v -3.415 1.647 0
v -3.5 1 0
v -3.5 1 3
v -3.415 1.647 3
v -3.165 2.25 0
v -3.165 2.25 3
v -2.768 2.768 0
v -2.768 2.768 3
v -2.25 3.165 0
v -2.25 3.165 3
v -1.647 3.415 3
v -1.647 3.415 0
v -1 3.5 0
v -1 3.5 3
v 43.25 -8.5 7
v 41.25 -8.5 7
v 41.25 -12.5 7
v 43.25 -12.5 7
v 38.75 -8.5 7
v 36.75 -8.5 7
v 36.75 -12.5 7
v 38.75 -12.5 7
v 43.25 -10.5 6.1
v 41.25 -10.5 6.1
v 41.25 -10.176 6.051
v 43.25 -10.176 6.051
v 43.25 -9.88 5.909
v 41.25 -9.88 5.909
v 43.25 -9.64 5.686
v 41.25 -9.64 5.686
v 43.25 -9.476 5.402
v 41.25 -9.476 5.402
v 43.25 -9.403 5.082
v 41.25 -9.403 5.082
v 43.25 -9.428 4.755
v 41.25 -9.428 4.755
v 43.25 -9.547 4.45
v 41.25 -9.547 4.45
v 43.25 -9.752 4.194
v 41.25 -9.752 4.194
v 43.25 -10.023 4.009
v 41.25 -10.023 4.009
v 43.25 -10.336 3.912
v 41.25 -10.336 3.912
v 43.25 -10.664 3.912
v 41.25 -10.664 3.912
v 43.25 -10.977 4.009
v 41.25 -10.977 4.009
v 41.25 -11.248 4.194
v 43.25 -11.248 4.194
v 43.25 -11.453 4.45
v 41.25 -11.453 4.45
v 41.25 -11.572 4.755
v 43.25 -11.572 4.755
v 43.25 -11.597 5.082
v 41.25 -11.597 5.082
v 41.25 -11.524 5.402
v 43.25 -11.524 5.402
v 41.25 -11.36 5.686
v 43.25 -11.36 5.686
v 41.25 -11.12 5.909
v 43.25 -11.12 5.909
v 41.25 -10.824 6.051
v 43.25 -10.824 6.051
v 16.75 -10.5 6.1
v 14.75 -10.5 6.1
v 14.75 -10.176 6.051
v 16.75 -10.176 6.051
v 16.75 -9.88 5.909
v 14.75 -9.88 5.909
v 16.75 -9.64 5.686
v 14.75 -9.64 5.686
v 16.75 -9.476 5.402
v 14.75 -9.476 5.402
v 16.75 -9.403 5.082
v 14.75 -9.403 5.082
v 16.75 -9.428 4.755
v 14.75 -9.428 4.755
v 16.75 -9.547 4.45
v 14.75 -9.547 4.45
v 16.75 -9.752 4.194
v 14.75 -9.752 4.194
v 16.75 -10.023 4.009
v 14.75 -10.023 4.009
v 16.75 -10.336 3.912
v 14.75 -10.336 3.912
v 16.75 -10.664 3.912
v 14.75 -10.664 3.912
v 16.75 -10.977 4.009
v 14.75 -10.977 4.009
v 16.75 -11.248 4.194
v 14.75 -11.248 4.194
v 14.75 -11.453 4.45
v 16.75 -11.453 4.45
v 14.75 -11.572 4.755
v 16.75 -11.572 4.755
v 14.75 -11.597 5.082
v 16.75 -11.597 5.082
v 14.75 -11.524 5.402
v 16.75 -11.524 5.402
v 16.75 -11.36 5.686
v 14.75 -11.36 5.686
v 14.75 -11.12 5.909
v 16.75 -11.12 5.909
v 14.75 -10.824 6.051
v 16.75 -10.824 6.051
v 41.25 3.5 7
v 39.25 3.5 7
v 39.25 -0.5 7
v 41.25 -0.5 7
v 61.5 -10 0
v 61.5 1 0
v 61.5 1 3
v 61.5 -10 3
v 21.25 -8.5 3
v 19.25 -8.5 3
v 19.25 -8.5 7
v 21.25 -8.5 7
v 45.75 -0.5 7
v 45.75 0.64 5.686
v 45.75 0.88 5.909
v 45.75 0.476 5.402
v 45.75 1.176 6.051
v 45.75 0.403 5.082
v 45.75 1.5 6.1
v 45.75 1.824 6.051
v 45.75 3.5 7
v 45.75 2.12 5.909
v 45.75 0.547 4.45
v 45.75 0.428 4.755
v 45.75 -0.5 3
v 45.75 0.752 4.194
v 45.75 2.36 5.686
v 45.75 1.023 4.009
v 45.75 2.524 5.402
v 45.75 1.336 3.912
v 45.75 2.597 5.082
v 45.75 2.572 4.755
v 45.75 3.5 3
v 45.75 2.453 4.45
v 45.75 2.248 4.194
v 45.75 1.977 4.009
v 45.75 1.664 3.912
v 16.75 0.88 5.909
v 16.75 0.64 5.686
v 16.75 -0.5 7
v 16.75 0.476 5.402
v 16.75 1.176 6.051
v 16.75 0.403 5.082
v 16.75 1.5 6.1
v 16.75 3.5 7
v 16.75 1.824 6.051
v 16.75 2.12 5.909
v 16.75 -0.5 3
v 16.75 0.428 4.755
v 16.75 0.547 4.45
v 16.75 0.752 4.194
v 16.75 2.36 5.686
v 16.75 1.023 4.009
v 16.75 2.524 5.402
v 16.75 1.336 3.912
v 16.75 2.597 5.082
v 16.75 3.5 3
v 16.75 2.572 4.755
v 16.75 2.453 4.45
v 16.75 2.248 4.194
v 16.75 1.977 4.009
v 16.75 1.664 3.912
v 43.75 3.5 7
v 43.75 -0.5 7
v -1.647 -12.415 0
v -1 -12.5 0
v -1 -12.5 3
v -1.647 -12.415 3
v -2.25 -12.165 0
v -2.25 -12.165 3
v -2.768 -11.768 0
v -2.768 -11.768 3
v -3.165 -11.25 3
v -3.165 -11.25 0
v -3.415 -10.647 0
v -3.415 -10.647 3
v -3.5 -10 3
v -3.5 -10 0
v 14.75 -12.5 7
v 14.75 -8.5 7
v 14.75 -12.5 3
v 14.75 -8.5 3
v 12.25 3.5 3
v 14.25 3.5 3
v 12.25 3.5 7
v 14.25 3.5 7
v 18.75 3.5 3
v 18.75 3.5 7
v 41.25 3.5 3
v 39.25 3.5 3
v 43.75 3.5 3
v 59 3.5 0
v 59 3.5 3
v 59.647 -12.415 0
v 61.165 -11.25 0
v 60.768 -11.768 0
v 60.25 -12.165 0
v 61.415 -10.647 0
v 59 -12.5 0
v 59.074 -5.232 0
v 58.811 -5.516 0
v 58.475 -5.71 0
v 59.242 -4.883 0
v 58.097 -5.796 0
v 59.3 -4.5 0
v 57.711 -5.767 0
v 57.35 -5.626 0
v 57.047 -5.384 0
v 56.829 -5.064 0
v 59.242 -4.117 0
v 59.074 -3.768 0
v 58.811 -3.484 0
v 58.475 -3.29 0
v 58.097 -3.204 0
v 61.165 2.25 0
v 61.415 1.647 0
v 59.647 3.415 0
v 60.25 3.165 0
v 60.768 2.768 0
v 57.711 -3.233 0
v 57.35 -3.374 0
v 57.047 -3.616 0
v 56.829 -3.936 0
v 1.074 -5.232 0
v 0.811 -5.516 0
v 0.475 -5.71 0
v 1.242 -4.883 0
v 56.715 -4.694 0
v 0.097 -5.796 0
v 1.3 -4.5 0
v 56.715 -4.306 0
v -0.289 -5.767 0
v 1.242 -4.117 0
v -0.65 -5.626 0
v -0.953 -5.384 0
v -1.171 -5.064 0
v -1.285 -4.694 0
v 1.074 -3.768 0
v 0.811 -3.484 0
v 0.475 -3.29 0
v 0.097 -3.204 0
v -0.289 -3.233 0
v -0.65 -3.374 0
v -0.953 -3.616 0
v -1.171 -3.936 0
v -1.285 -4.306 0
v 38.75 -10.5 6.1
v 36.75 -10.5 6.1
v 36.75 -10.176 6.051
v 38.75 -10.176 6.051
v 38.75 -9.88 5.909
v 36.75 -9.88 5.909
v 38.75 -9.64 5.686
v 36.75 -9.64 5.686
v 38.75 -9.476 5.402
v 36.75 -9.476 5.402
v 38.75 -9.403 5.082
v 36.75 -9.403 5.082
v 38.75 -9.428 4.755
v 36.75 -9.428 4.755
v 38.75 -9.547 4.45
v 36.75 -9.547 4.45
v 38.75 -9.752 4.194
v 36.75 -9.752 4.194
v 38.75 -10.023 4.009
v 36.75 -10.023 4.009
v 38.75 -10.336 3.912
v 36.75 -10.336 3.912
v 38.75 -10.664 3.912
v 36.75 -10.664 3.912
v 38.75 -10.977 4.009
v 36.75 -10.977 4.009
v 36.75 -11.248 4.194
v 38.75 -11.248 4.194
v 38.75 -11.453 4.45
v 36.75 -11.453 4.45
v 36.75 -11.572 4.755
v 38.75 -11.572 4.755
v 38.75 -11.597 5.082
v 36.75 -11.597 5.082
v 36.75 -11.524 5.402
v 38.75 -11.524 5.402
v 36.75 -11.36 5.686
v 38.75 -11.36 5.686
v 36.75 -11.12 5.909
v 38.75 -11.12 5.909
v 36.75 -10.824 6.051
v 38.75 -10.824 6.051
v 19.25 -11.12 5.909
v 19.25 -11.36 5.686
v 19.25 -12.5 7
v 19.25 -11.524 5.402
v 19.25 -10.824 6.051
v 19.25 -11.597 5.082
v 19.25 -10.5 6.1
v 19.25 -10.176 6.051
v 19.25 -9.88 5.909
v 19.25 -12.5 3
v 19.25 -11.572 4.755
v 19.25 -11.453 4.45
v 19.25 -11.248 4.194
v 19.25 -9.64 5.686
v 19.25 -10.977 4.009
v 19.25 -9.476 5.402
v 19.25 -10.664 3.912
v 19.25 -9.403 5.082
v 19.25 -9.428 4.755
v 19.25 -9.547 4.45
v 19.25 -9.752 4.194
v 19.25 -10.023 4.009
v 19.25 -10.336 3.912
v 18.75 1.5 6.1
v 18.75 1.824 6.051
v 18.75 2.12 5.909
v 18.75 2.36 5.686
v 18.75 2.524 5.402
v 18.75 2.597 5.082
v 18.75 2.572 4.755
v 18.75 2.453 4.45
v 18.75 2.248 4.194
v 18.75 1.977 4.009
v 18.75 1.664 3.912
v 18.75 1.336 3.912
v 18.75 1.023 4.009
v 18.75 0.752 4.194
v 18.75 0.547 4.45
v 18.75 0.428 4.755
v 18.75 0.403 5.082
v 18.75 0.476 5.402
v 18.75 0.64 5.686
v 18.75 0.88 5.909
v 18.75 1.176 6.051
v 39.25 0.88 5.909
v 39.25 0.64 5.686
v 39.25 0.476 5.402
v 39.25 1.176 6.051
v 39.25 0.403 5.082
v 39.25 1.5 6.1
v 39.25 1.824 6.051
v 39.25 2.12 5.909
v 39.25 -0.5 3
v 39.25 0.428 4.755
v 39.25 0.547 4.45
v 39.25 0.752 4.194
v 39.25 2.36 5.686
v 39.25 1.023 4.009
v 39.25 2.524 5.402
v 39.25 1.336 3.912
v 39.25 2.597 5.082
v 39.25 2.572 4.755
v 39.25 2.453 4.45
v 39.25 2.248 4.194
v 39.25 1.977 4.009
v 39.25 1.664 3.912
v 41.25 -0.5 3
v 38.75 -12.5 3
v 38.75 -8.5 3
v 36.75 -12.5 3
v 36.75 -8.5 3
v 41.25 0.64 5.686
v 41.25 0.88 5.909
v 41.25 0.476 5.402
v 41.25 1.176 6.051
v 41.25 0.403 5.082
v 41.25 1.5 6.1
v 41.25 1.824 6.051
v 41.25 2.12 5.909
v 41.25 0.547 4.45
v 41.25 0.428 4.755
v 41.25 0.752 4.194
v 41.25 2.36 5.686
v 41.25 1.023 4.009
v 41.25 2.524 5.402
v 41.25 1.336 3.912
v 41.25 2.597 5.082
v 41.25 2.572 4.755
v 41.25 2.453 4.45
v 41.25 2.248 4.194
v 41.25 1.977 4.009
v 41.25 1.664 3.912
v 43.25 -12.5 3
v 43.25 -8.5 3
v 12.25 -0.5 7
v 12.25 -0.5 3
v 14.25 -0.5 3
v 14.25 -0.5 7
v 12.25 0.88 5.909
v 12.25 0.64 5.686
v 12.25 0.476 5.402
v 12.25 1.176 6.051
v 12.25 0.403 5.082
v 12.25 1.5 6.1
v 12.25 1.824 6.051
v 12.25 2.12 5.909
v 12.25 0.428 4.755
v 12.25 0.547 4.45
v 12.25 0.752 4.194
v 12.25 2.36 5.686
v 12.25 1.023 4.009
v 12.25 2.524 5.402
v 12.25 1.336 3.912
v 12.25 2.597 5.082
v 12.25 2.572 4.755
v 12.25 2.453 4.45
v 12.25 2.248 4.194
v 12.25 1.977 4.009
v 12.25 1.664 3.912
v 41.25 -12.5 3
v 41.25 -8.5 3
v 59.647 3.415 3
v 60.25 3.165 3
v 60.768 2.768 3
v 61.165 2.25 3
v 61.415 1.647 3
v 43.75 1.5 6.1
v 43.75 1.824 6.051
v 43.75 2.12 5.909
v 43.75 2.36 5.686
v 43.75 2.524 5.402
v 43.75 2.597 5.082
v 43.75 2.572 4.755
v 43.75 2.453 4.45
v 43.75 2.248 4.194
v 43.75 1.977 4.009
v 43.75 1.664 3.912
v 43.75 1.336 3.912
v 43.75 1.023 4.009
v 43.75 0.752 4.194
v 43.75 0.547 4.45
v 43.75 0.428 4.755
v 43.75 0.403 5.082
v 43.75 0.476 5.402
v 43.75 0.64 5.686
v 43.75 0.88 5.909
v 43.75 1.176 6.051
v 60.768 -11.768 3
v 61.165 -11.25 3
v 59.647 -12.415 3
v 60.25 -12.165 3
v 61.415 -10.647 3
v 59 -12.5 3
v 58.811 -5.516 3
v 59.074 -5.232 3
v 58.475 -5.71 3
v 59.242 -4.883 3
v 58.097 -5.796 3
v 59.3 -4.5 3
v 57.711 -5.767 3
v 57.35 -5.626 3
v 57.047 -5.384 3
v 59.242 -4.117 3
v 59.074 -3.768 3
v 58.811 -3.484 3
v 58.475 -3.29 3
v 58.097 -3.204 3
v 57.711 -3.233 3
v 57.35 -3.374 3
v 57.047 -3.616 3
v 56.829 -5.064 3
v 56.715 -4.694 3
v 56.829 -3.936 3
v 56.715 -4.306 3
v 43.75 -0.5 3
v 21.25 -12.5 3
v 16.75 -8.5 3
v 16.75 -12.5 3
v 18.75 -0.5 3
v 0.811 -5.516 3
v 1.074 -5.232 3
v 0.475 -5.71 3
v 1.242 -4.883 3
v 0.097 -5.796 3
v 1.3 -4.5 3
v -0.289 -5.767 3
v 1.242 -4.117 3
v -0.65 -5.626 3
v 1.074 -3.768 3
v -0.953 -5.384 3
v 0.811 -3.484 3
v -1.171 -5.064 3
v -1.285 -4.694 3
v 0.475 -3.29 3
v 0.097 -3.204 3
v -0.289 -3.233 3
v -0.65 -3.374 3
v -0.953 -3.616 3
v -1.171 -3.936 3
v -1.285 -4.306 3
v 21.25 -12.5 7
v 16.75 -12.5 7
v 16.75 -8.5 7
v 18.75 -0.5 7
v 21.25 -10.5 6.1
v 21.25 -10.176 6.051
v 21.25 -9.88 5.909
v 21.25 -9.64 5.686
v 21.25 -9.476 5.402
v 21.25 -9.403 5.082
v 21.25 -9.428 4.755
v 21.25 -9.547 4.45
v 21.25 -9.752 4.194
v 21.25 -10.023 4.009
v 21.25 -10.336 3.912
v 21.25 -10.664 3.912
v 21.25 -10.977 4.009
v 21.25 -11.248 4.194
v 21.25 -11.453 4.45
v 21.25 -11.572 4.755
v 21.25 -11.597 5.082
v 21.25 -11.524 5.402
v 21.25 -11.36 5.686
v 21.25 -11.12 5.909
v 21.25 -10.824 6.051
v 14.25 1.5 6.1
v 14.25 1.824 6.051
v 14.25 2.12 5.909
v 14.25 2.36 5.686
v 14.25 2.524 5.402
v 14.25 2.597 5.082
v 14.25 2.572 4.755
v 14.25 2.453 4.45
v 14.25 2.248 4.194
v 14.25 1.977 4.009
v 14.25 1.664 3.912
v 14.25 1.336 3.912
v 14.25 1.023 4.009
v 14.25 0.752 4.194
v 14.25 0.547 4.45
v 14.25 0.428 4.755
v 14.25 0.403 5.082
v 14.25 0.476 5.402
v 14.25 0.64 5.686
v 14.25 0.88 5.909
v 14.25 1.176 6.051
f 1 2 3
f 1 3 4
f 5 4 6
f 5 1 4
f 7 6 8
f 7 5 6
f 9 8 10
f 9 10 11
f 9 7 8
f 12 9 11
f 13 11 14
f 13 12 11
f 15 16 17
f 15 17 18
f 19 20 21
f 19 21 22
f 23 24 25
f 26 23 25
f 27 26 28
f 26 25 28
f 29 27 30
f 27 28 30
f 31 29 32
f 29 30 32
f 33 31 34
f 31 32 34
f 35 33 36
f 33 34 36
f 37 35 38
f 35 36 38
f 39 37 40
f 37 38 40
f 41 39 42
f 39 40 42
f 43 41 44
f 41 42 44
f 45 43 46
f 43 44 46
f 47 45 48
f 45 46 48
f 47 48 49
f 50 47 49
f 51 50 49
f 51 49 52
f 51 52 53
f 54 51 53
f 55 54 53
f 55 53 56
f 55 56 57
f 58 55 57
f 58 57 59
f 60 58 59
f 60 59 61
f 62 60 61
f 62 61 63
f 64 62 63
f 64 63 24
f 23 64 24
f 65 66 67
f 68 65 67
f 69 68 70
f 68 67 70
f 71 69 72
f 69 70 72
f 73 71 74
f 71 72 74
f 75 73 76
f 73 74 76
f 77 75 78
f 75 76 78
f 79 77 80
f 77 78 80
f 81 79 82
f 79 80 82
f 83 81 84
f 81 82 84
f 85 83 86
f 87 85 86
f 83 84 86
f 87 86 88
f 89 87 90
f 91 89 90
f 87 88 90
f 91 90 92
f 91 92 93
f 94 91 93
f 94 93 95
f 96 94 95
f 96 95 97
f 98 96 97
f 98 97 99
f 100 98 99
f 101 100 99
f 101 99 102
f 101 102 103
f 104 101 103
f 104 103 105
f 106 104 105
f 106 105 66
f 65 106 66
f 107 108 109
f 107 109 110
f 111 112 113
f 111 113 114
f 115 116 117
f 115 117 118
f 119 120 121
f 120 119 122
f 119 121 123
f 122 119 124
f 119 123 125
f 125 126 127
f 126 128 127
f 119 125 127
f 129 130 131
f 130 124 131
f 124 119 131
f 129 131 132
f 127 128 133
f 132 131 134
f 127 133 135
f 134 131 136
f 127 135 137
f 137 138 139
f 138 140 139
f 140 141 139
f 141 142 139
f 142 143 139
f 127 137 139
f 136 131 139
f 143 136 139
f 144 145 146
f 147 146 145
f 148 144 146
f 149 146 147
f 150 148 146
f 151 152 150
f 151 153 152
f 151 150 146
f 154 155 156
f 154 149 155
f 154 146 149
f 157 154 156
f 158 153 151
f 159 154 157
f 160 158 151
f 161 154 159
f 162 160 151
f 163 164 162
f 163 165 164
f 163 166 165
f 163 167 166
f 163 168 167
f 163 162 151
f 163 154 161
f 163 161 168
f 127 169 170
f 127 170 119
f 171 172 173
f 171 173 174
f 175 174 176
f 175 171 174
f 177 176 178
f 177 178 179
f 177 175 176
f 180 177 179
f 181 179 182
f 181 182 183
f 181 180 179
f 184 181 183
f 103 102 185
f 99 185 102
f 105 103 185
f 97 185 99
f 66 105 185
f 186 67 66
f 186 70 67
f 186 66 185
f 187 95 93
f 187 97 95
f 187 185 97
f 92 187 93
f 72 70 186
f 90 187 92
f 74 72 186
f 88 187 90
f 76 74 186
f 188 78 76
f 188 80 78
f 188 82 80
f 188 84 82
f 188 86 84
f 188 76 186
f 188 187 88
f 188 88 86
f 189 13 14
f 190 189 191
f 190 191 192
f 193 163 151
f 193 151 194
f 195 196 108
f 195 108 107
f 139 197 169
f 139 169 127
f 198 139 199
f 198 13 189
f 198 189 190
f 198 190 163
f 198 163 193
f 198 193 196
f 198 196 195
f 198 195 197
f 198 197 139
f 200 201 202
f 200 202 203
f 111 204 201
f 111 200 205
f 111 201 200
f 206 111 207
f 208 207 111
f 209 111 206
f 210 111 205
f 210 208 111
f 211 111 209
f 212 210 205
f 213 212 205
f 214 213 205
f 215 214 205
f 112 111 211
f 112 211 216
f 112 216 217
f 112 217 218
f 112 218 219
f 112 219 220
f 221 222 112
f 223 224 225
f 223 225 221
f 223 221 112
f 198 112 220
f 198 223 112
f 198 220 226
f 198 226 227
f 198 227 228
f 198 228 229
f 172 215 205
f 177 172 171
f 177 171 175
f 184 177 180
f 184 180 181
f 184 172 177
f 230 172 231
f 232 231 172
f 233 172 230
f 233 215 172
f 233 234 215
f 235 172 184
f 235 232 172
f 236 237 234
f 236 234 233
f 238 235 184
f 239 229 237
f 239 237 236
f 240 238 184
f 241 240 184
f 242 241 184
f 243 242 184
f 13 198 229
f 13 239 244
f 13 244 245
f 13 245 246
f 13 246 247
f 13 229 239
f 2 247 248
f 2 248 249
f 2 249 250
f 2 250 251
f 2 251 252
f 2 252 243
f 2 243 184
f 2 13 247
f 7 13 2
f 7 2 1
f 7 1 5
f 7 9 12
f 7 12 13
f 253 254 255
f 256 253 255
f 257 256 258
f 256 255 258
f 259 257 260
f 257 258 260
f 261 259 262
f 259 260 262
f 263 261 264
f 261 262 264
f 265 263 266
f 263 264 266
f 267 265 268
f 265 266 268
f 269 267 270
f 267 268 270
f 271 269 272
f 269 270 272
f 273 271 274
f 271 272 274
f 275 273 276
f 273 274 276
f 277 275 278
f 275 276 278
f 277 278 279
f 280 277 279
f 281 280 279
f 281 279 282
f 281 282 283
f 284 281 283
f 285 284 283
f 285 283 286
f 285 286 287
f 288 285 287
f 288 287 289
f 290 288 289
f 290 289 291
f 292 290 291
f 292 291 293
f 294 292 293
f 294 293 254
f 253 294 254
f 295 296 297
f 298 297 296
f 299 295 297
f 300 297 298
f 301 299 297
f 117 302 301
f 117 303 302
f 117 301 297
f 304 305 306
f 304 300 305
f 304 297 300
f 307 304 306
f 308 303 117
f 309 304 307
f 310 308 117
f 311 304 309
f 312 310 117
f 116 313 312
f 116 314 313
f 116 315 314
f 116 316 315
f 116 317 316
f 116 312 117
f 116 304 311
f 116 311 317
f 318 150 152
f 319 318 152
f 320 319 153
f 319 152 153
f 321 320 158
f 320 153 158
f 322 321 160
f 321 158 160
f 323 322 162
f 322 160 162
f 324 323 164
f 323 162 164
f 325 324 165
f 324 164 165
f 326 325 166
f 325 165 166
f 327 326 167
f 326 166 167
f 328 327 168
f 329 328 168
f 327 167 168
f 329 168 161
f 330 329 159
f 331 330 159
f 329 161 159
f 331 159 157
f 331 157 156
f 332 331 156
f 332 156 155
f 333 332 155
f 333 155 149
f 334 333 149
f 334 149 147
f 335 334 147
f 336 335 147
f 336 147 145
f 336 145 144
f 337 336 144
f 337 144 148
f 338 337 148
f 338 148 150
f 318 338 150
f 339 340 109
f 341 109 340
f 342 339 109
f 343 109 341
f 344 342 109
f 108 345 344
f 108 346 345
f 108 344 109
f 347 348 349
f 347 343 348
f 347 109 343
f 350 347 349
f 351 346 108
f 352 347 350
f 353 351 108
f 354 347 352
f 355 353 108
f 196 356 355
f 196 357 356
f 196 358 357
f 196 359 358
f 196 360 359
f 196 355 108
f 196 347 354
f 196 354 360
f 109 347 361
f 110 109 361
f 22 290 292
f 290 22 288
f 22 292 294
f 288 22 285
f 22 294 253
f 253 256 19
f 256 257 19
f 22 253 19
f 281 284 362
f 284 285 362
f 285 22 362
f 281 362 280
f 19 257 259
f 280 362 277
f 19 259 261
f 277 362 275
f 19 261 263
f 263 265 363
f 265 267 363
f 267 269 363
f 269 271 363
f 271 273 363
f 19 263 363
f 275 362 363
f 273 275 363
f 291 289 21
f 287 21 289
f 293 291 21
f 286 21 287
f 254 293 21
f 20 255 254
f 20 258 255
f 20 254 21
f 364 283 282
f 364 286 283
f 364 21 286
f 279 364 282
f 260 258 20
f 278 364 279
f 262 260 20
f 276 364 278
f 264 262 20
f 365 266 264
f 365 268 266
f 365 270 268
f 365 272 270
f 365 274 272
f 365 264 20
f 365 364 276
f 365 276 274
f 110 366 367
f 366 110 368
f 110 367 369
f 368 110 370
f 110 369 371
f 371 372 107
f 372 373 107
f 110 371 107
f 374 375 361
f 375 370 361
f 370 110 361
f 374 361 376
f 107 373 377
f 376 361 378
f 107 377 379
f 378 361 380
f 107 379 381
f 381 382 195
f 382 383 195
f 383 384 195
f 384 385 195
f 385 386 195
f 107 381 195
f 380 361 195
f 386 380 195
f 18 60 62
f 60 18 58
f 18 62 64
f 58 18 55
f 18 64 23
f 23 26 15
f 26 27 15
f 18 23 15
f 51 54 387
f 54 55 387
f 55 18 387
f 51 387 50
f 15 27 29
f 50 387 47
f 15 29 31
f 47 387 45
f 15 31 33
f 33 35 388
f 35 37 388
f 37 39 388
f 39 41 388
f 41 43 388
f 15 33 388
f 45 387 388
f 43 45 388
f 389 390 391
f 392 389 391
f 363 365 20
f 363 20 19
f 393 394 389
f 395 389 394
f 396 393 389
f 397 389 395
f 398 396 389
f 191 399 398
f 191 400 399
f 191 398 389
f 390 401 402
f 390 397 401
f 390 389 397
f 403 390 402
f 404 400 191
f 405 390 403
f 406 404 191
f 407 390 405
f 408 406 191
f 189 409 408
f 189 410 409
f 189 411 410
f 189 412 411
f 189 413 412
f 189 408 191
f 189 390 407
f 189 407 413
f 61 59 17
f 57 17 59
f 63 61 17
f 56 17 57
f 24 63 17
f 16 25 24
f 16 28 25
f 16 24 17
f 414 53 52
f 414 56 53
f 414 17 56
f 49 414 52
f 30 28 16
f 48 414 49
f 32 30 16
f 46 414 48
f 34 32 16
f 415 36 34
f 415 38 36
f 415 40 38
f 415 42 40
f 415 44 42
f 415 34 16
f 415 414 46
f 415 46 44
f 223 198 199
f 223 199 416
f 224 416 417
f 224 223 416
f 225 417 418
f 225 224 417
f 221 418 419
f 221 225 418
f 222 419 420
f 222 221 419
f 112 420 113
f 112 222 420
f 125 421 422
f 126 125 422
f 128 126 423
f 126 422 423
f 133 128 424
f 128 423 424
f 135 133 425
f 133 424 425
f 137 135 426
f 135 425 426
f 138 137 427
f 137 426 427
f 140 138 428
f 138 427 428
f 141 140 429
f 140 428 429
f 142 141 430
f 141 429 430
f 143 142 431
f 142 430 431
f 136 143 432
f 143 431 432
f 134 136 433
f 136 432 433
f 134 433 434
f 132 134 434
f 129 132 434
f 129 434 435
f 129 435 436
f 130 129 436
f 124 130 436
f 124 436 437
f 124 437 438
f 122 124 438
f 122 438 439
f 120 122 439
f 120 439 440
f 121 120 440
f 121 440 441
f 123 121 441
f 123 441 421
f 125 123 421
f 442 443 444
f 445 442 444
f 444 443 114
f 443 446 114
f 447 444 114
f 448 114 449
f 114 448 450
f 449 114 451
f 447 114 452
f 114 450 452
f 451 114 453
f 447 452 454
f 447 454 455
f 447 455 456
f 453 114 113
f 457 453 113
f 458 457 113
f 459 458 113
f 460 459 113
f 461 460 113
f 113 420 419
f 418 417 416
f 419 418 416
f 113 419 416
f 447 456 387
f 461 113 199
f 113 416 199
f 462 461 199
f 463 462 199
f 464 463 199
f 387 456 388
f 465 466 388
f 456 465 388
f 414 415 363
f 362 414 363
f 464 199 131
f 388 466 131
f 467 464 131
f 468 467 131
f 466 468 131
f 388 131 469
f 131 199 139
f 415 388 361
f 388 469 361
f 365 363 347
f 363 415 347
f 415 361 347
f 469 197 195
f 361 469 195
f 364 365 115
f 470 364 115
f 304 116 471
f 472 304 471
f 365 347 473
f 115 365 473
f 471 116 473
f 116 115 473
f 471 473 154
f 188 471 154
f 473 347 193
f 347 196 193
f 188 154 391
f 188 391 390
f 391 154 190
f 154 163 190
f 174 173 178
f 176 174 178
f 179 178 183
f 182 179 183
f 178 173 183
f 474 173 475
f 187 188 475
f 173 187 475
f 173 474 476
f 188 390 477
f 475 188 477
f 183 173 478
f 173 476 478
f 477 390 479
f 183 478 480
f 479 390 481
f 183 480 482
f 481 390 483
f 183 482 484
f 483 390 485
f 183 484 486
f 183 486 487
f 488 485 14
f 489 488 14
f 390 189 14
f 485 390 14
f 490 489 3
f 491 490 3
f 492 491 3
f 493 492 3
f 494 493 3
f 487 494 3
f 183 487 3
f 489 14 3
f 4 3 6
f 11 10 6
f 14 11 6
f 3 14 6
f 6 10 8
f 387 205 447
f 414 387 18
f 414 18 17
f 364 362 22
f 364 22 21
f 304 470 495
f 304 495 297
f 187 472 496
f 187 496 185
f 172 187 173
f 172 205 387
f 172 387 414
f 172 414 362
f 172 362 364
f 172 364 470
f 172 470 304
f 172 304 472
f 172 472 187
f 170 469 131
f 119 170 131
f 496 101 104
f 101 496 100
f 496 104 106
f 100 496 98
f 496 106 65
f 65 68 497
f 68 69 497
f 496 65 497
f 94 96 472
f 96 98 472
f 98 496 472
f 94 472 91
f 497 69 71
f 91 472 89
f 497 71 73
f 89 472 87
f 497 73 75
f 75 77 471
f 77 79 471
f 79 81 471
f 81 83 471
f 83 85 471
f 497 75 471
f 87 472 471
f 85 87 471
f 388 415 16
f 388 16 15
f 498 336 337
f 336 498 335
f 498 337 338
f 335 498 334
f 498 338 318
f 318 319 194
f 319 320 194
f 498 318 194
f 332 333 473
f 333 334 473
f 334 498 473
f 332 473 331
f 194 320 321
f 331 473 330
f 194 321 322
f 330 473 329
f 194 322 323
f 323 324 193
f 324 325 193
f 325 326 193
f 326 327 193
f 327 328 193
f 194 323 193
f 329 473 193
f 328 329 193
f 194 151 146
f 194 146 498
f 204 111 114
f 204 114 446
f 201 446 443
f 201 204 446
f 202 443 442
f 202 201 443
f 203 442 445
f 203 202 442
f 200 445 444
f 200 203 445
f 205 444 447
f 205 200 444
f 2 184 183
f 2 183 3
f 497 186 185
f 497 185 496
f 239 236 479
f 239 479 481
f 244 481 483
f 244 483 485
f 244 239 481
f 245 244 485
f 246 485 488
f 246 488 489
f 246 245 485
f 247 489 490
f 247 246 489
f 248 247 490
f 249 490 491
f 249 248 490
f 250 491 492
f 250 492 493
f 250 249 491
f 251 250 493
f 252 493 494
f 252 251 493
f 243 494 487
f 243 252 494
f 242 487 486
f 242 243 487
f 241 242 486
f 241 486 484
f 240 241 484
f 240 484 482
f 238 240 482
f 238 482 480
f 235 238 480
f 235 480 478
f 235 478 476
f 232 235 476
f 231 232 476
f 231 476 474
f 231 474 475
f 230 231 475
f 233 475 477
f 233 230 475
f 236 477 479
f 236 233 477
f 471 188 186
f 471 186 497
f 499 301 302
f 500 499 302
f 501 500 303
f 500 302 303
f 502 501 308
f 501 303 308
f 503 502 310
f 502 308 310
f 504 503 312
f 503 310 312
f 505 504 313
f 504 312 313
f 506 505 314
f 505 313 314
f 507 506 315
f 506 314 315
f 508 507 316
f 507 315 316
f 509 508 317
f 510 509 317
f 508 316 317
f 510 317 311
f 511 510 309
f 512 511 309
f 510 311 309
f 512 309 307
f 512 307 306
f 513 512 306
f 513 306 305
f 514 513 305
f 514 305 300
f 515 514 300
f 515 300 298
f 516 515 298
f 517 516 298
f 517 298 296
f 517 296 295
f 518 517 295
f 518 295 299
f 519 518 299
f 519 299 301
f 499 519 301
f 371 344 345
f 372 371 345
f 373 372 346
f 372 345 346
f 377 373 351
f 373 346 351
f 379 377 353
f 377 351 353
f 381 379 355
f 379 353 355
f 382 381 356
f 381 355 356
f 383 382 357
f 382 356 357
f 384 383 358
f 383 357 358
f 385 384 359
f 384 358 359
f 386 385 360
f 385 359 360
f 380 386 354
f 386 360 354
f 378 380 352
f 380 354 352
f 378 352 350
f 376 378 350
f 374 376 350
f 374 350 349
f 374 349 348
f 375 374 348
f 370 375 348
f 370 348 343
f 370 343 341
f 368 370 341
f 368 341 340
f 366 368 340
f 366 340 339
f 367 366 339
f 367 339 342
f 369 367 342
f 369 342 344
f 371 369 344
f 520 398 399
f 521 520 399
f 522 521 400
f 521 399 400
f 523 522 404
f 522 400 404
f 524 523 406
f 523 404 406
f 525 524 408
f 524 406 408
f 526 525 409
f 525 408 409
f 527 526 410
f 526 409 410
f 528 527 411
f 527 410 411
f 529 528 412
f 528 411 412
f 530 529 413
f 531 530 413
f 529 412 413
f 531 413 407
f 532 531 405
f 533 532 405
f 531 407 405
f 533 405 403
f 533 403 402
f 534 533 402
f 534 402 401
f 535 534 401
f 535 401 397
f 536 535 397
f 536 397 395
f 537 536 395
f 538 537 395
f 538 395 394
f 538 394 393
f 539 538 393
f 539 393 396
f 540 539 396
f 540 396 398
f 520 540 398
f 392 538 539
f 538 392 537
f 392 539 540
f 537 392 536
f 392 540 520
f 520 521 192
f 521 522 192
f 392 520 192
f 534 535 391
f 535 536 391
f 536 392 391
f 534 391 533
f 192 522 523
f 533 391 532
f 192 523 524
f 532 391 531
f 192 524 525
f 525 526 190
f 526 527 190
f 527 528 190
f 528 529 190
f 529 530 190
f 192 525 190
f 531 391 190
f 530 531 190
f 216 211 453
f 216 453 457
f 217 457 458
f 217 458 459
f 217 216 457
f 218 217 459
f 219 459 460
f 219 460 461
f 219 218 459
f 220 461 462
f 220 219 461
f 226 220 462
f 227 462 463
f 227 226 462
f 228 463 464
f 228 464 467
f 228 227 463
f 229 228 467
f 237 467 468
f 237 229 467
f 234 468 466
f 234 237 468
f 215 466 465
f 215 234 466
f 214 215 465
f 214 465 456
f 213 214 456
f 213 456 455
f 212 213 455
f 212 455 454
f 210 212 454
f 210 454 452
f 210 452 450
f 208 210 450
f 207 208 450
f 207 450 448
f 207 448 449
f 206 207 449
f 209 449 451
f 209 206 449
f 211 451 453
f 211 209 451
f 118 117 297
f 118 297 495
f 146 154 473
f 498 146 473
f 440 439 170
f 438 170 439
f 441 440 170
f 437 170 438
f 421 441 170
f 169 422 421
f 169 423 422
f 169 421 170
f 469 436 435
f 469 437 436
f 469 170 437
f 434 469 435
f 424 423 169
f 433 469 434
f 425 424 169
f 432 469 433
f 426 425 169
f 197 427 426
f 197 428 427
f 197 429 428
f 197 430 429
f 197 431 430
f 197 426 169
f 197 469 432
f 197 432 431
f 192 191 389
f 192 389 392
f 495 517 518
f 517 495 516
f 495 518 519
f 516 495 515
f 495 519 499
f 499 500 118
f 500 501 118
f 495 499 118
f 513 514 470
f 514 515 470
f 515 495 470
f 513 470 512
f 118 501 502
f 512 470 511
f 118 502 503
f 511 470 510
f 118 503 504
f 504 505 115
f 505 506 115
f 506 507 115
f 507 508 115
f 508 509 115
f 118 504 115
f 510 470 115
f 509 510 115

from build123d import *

# Parameters (mm, degrees)
SKETCH_2_R          = 1.3
EXTRUDE_2_DEPTH     = 3
SKETCH_4_W          = 2
SKETCH_4_H          = 4
EXTRUDE_3_DEPTH     = 4
SKETCH_6_R          = 1.1
CUT_EXTRUDE_2_DEPTH = 50.25


with BuildPart() as part:
    # 草图2 → 凸台-拉伸2 (new body)
    with BuildSketch(Plane.XY):
        with BuildLine():
            Line((-3.5, -10), (-3.5, 1))
            ThreePointArc((-3.5, 1), (-2.767766953, 2.767766953), (-1, 3.5))
            Line((-1, 3.5), (59, 3.5))
            ThreePointArc((59, 3.5), (60.767766953, 2.767766953), (61.5, 1))
            Line((61.5, 1), (61.5, -10))
            ThreePointArc((61.5, -10), (60.767766953, -11.767766953), (59, -12.5))
            Line((59, -12.5), (-1, -12.5))
            ThreePointArc((-1, -12.5), (-2.767766953, -11.767766953), (-3.5, -10))
        make_face()
        with Locations((58, -4.5)):
            Circle(SKETCH_2_R, mode=Mode.SUBTRACT)
        with Locations((0, -4.5)):
            Circle(SKETCH_2_R, mode=Mode.SUBTRACT)
    extrude(amount=EXTRUDE_2_DEPTH)

    # 草图4 → 凸台-拉伸3 (add)
    with BuildSketch(Plane.XY.offset(3)):
        with Locations((13.25, 1.5)):
            Rectangle(SKETCH_4_W, SKETCH_4_H)
        with Locations((17.75, 1.5)):
            Rectangle(SKETCH_4_W, SKETCH_4_H)
        with Locations((40.25, 1.5)):
            Rectangle(SKETCH_4_W, SKETCH_4_H)
        with Locations((44.75, 1.5)):
            Rectangle(SKETCH_4_W, SKETCH_4_H)
        with Locations((15.75, -10.5)):
            Rectangle(SKETCH_4_W, SKETCH_4_H)
        with Locations((20.25, -10.5)):
            Rectangle(SKETCH_4_W, SKETCH_4_H)
        with Locations((37.75, -10.5)):
            Rectangle(SKETCH_4_W, SKETCH_4_H)
        with Locations((42.25, -10.5)):
            Rectangle(SKETCH_4_W, SKETCH_4_H)
    extrude(amount=EXTRUDE_3_DEPTH)

    # 草图6 → 切除-拉伸2 (cut, through all)
    with BuildSketch(Plane.ZY.offset(-12.25)):
        with Locations((5, 1.5)):
            Circle(SKETCH_6_R)
        with Locations((5, -10.5)):
            Circle(SKETCH_6_R)
    extrude(amount=-CUT_EXTRUDE_2_DEPTH, mode=Mode.SUBTRACT)


solid = part.part
